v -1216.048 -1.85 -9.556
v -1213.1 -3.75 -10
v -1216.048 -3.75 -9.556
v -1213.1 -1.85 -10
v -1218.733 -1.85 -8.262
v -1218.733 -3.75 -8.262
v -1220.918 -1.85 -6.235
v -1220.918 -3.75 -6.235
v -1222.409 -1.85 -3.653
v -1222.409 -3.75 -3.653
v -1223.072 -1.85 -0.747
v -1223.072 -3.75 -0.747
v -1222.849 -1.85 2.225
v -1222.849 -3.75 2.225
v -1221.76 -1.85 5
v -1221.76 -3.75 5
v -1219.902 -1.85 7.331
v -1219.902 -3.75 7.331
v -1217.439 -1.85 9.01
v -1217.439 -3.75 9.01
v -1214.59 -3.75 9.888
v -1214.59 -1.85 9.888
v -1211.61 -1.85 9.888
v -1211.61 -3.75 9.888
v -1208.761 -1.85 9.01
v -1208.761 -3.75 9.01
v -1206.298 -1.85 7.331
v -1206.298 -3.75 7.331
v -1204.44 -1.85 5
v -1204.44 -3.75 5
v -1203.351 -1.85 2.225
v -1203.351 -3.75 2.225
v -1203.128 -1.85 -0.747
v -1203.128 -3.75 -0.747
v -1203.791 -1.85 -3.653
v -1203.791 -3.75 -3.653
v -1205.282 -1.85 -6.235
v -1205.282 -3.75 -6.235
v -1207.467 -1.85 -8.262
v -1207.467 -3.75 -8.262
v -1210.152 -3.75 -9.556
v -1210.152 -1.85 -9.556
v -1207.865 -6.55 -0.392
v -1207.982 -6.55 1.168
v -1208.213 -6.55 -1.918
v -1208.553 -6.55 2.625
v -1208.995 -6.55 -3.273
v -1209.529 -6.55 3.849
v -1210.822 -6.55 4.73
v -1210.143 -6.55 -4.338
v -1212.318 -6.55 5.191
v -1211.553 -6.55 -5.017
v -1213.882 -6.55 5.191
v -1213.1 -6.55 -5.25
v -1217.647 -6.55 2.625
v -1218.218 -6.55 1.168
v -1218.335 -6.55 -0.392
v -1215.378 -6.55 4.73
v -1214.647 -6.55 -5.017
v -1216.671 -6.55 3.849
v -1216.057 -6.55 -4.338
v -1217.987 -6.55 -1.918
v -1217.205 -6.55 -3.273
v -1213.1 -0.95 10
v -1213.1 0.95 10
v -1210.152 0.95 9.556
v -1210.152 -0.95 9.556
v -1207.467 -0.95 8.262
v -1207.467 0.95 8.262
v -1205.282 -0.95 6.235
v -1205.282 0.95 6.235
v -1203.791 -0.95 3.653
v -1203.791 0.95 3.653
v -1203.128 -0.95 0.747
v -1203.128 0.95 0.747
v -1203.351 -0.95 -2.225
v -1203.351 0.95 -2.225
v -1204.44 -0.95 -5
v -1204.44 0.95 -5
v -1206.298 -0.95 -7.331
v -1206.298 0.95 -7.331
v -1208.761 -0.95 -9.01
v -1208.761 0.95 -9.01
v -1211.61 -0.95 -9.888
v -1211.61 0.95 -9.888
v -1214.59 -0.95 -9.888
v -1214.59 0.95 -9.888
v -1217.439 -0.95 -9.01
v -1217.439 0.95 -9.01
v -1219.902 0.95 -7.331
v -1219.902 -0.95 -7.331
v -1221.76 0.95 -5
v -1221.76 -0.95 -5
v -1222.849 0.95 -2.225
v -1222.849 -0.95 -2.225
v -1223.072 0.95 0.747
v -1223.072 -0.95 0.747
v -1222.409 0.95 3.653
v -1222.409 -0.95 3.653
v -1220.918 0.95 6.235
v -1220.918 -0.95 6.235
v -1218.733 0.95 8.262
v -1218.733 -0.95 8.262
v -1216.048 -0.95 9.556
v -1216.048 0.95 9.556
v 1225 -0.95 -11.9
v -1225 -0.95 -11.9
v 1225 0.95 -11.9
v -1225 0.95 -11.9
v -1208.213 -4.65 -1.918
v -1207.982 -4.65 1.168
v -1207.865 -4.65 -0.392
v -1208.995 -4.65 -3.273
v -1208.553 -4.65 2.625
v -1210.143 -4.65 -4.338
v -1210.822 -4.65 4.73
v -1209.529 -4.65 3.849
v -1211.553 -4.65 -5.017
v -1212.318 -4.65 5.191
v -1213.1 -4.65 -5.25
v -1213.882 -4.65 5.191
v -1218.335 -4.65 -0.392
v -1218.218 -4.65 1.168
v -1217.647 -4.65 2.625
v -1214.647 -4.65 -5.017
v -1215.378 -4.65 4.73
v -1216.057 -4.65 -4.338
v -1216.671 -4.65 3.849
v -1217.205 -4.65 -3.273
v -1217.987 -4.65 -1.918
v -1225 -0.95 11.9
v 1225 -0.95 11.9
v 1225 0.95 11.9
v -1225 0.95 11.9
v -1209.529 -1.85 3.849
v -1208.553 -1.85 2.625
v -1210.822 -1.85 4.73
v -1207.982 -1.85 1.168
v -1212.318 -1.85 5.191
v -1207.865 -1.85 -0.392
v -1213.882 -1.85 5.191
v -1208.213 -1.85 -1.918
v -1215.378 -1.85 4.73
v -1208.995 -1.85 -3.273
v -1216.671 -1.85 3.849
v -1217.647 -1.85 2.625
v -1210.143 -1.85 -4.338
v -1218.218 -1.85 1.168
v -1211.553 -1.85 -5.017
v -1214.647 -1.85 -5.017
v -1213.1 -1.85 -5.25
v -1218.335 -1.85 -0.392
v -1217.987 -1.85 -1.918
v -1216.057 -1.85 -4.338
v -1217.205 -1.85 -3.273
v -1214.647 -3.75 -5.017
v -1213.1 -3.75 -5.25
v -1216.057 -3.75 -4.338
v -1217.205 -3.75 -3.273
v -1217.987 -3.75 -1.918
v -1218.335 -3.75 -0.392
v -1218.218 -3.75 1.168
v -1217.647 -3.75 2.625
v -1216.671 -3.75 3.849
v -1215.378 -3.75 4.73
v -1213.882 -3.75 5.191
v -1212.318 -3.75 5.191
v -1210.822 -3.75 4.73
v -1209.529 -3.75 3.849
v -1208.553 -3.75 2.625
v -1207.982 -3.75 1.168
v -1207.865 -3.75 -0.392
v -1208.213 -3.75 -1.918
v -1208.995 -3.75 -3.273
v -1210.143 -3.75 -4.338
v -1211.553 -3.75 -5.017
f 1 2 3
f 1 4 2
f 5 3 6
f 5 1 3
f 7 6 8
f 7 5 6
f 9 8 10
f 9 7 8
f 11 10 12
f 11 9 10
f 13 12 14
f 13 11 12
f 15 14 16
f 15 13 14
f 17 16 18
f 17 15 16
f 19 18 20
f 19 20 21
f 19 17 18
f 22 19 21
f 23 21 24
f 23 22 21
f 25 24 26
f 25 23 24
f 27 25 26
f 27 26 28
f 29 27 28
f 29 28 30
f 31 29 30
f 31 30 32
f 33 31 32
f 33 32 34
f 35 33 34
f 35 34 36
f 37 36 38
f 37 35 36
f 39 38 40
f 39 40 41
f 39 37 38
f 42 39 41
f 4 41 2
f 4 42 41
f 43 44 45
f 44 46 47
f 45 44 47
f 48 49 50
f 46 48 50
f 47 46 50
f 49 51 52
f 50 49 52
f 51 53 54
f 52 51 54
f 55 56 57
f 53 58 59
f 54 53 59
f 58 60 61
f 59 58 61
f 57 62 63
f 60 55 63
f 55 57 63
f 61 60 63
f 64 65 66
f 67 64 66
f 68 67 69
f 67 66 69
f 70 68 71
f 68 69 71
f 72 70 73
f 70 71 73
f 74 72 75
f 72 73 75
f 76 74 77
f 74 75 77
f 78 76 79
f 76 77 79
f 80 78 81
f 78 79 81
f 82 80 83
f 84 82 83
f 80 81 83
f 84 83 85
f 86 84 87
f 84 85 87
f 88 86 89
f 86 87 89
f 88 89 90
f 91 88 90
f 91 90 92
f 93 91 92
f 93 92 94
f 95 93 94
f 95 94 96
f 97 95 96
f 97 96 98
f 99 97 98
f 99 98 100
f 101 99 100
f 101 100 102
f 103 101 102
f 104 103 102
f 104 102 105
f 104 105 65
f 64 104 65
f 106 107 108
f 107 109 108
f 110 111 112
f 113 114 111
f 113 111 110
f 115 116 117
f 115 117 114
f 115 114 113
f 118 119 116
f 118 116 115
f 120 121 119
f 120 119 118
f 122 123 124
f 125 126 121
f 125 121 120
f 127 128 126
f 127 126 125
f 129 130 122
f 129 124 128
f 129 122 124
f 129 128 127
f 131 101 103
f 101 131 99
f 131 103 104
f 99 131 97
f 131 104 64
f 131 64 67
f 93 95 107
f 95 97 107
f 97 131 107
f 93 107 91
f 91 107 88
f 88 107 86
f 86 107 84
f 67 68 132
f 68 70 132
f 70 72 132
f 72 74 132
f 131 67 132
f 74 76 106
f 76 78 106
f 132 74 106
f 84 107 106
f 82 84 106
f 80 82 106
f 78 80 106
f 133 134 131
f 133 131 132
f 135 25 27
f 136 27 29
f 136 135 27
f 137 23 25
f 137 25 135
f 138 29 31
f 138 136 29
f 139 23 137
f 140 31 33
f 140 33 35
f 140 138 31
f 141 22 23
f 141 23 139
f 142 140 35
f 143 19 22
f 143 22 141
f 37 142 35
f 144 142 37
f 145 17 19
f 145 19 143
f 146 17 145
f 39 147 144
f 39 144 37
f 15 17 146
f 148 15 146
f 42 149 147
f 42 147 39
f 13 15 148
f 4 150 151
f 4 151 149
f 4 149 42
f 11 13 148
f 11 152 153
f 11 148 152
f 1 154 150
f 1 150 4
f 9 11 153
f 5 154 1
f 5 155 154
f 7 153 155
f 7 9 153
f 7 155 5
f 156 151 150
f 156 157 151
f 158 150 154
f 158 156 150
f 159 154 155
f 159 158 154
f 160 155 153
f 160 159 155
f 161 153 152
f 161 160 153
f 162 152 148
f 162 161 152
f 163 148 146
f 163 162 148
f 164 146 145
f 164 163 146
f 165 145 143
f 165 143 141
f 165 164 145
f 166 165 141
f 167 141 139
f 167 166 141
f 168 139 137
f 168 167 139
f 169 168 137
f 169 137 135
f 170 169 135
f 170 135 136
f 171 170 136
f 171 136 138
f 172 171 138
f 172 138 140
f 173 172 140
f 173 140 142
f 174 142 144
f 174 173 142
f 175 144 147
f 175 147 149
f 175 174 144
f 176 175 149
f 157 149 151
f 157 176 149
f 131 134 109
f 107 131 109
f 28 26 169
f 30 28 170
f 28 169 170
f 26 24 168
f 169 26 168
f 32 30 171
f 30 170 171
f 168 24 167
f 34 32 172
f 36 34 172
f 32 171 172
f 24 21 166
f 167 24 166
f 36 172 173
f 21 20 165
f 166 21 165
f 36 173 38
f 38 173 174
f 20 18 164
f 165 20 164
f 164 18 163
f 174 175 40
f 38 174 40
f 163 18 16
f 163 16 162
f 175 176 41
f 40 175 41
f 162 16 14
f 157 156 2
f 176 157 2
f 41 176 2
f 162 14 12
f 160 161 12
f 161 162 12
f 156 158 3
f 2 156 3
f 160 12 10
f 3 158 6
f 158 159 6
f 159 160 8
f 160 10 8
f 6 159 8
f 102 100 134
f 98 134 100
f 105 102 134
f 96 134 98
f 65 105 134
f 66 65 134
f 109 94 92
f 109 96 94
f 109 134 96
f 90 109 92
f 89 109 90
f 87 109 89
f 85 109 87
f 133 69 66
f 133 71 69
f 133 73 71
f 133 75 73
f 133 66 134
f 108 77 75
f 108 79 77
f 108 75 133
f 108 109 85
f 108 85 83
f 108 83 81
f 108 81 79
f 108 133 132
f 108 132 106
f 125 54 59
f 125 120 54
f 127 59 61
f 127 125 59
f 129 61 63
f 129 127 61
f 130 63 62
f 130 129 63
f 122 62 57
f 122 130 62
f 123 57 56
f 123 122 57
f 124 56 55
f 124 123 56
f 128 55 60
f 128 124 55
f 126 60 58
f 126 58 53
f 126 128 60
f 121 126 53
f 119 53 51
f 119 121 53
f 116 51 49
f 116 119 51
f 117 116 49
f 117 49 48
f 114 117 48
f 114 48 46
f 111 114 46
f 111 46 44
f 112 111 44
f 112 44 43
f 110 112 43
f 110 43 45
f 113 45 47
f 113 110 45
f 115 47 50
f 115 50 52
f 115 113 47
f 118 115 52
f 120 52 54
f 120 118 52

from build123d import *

# Parameters (mm, degrees)
SKETCH1_W           = 2450
SKETCH1_H           = 23.8
BOSS_EXTRUDE1_DEPTH = 0.95
CUT_EXTRUDE1_REACH  = 1227.059
SKETCH3_R           = 10
SKETCH4_R           = 10
SKETCH4_R_2         = 5.25
BOSS_EXTRUDE3_DEPTH = 0.95
SKETCH5_R           = 5.25
BOSS_EXTRUDE4_DEPTH = 0.95


with BuildPart() as part:
    # Sketch1 → Boss-Extrude1 (new, symmetric)
    with BuildSketch(Plane(origin=(0, 0, 0), x_dir=(1, 0, 0), z_dir=(0, 1, 0))):
        Rectangle(SKETCH1_W, SKETCH1_H)
    extrude(amount=BOSS_EXTRUDE1_DEPTH, both=True)

    # Sketch3 → Cut-Extrude1 (cut, up to next)
    with BuildSketch(Plane(origin=(0, 0.95, 0), x_dir=(1, 0, 0), z_dir=(0, 1, 0)), mode=Mode.PRIVATE) as cut_extrude1_sk1:
        with Locations(Location((-1213.1, 0, 0), (0, 0, 270))):
            Circle(SKETCH3_R)
    cut_extrude1_tool1 = extrude(cut_extrude1_sk1.sketch, amount=-CUT_EXTRUDE1_REACH, mode=Mode.PRIVATE) & part.part
    add(cut_extrude1_tool1.solids().sort_by_distance((-1213.1, 0.95, 0))[0], mode=Mode.SUBTRACT)


with BuildPart() as body_2:
    # Sketch4 → Boss-Extrude3 (new, symmetric)
    with BuildSketch(Plane(origin=(0, -2.8, 0), x_dir=(1, 0, 0), z_dir=(0, 1, 0))):
        with Locations(Location((-1213.1, 0, 0), (0, 0, 90))):
            Circle(SKETCH4_R)
        with Locations(Location((-1213.1, 0, 0), (0, 0, 90))):
            Circle(SKETCH4_R_2, mode=Mode.SUBTRACT)
    extrude(amount=BOSS_EXTRUDE3_DEPTH, both=True)


with BuildPart() as body_3:
    # Sketch5 → Boss-Extrude4 (new, symmetric)
    with BuildSketch(Plane(origin=(0, -5.6, 0), x_dir=(1, 0, 0), z_dir=(0, 1, 0))):
        with Locations(Location((-1213.1, 0, 0), (0, 0, 90))):
            Circle(SKETCH5_R)
    extrude(amount=BOSS_EXTRUDE4_DEPTH, both=True)


solid = Compound([part.part, body_2.part, body_3.part])
